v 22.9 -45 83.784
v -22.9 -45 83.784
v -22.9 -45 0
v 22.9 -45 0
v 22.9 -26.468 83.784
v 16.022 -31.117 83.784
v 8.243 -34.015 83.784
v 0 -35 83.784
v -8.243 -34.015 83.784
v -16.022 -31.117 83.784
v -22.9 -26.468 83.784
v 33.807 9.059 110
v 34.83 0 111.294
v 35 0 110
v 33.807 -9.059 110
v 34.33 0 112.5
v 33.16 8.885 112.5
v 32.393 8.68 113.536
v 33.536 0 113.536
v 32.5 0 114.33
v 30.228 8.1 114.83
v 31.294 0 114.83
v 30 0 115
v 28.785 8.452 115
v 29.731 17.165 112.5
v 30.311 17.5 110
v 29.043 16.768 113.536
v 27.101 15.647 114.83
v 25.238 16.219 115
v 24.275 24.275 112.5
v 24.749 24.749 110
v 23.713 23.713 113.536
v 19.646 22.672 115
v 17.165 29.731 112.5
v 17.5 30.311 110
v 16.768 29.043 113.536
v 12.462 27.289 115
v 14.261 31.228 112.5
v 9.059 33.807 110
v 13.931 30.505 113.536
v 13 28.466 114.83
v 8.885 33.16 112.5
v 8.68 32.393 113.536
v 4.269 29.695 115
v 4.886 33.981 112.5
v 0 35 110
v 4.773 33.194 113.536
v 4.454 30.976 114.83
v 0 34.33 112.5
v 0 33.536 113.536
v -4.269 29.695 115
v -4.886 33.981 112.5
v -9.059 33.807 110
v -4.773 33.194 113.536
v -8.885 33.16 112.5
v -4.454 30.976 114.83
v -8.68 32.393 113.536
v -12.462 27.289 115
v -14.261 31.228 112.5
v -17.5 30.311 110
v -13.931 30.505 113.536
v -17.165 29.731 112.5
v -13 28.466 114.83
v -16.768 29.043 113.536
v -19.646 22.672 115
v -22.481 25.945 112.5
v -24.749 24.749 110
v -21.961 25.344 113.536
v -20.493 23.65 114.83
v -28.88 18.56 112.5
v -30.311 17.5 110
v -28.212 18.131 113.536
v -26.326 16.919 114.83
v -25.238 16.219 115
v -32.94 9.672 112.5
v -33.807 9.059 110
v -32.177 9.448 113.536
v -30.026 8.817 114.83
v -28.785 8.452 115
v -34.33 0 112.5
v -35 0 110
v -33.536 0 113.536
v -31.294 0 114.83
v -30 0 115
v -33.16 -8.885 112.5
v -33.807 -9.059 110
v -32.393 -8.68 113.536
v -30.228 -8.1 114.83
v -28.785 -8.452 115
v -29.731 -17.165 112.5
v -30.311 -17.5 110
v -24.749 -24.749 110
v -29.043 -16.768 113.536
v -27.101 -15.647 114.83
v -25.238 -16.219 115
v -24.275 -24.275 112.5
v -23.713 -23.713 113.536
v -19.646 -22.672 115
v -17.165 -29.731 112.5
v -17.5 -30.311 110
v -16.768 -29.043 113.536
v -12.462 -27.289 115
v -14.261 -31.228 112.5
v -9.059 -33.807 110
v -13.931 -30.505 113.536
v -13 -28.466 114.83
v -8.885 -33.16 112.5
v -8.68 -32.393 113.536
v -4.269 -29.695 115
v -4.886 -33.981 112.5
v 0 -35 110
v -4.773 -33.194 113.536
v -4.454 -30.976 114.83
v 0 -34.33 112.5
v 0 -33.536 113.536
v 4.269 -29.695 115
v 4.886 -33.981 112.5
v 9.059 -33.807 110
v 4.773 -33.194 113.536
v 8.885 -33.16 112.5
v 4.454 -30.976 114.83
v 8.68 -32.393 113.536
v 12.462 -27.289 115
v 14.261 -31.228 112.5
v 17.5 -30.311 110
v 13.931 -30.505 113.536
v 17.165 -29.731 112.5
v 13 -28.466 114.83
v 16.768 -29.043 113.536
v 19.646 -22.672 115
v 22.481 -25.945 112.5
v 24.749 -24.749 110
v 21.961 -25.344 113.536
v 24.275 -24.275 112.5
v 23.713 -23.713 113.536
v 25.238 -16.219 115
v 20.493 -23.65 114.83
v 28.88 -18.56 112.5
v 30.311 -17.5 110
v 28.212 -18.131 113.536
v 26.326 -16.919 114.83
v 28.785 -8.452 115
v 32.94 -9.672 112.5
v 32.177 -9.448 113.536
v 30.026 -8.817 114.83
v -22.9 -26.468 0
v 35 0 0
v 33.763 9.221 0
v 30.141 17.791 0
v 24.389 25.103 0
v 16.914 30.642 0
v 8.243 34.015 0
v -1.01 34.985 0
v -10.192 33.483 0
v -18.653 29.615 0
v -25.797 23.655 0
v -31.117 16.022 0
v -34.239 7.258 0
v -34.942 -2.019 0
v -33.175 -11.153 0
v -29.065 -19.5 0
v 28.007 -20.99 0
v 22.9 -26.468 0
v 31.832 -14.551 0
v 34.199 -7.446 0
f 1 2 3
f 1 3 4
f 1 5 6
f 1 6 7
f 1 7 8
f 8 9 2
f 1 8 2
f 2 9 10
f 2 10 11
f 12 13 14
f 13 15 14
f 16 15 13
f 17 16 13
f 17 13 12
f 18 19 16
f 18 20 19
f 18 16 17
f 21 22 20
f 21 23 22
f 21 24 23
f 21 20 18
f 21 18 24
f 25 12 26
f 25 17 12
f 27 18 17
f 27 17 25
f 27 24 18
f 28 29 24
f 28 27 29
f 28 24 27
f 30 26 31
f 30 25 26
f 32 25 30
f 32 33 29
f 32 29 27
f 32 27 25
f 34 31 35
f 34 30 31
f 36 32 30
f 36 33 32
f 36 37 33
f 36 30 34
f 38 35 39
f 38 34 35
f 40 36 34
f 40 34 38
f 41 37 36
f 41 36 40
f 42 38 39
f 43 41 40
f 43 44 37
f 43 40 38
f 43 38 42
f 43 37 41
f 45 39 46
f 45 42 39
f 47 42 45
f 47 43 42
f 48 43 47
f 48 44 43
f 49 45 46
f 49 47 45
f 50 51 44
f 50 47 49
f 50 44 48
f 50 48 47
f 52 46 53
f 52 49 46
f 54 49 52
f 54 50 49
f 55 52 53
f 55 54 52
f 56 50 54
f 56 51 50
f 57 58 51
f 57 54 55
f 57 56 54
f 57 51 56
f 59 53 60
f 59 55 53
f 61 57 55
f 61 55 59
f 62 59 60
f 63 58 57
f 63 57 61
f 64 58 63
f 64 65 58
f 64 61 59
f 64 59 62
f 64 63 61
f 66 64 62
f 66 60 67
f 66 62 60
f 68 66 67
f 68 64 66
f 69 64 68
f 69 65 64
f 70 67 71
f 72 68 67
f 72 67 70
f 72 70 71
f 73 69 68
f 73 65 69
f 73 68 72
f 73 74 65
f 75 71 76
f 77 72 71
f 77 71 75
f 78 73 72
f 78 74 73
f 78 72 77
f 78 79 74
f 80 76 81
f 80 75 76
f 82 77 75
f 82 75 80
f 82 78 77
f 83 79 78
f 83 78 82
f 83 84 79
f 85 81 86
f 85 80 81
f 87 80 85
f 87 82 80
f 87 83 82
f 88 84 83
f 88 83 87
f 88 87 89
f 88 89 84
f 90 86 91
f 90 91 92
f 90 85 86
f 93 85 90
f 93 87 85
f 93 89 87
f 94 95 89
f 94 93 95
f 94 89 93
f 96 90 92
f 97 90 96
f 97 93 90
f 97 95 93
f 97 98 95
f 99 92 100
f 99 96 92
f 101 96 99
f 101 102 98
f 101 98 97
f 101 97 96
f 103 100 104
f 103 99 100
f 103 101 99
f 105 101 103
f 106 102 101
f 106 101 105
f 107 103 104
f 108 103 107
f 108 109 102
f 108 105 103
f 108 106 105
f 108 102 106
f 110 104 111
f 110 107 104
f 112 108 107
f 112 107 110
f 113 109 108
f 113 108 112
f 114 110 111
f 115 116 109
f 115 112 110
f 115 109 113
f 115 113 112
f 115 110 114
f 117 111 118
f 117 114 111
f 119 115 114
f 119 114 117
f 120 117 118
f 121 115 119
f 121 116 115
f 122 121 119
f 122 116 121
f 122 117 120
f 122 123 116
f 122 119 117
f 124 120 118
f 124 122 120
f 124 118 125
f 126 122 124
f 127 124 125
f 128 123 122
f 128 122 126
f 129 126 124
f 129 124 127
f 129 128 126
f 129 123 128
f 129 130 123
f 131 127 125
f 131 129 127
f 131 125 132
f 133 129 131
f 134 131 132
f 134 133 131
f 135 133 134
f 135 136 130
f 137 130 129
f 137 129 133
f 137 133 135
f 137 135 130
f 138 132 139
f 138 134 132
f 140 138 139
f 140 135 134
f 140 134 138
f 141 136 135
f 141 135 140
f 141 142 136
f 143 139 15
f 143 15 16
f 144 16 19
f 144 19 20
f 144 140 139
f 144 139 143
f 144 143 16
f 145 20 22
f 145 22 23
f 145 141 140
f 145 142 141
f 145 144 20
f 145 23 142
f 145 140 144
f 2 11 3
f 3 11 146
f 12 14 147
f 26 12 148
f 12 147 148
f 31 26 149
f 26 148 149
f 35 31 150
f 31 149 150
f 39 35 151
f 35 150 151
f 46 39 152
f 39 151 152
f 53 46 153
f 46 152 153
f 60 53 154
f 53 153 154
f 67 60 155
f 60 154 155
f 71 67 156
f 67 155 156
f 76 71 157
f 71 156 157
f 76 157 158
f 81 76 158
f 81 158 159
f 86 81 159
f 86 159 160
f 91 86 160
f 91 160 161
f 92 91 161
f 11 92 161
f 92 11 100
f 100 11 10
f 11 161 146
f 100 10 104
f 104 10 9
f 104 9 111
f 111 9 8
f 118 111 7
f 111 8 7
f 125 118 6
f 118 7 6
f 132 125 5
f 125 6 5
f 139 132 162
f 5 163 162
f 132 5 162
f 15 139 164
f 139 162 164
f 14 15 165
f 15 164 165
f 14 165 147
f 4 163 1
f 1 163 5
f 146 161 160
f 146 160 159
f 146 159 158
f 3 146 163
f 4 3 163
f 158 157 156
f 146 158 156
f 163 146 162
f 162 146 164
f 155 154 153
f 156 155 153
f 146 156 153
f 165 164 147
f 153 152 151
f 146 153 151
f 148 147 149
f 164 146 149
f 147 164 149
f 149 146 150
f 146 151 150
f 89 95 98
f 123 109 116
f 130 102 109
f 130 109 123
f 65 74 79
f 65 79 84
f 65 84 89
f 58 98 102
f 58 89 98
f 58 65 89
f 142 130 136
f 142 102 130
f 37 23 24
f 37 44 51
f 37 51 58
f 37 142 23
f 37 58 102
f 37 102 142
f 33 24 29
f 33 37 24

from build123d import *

# Parameters (mm, degrees)
F0_R     = 35
F1_DEPTH = 115
F2_R     = 5
F4_DEPTH = 45


with BuildPart() as f1:
    # F0 (on Top) → F1 (new body)
    with BuildSketch(Plane.XY):
        Circle(F0_R)
    extrude(amount=F1_DEPTH)

    # F2
    f2_edges = [f1.edges().sort_by_distance(p)[0] for p in [
        (-35, 0, 115),
    ]]
    fillet(f2_edges, radius=F2_R)

    # F3 (on Front) → F4 (join)
    with BuildSketch(Plane.XZ):
        Polygon((22.900352, 83.783798), (-22.900352, 83.783798), (-22.900352, 28.148592), (-22.900352, 0), (22.900352, 0), (22.900352, 28.148592), align=None)
    extrude(amount=F4_DEPTH)


solid = f1.part
